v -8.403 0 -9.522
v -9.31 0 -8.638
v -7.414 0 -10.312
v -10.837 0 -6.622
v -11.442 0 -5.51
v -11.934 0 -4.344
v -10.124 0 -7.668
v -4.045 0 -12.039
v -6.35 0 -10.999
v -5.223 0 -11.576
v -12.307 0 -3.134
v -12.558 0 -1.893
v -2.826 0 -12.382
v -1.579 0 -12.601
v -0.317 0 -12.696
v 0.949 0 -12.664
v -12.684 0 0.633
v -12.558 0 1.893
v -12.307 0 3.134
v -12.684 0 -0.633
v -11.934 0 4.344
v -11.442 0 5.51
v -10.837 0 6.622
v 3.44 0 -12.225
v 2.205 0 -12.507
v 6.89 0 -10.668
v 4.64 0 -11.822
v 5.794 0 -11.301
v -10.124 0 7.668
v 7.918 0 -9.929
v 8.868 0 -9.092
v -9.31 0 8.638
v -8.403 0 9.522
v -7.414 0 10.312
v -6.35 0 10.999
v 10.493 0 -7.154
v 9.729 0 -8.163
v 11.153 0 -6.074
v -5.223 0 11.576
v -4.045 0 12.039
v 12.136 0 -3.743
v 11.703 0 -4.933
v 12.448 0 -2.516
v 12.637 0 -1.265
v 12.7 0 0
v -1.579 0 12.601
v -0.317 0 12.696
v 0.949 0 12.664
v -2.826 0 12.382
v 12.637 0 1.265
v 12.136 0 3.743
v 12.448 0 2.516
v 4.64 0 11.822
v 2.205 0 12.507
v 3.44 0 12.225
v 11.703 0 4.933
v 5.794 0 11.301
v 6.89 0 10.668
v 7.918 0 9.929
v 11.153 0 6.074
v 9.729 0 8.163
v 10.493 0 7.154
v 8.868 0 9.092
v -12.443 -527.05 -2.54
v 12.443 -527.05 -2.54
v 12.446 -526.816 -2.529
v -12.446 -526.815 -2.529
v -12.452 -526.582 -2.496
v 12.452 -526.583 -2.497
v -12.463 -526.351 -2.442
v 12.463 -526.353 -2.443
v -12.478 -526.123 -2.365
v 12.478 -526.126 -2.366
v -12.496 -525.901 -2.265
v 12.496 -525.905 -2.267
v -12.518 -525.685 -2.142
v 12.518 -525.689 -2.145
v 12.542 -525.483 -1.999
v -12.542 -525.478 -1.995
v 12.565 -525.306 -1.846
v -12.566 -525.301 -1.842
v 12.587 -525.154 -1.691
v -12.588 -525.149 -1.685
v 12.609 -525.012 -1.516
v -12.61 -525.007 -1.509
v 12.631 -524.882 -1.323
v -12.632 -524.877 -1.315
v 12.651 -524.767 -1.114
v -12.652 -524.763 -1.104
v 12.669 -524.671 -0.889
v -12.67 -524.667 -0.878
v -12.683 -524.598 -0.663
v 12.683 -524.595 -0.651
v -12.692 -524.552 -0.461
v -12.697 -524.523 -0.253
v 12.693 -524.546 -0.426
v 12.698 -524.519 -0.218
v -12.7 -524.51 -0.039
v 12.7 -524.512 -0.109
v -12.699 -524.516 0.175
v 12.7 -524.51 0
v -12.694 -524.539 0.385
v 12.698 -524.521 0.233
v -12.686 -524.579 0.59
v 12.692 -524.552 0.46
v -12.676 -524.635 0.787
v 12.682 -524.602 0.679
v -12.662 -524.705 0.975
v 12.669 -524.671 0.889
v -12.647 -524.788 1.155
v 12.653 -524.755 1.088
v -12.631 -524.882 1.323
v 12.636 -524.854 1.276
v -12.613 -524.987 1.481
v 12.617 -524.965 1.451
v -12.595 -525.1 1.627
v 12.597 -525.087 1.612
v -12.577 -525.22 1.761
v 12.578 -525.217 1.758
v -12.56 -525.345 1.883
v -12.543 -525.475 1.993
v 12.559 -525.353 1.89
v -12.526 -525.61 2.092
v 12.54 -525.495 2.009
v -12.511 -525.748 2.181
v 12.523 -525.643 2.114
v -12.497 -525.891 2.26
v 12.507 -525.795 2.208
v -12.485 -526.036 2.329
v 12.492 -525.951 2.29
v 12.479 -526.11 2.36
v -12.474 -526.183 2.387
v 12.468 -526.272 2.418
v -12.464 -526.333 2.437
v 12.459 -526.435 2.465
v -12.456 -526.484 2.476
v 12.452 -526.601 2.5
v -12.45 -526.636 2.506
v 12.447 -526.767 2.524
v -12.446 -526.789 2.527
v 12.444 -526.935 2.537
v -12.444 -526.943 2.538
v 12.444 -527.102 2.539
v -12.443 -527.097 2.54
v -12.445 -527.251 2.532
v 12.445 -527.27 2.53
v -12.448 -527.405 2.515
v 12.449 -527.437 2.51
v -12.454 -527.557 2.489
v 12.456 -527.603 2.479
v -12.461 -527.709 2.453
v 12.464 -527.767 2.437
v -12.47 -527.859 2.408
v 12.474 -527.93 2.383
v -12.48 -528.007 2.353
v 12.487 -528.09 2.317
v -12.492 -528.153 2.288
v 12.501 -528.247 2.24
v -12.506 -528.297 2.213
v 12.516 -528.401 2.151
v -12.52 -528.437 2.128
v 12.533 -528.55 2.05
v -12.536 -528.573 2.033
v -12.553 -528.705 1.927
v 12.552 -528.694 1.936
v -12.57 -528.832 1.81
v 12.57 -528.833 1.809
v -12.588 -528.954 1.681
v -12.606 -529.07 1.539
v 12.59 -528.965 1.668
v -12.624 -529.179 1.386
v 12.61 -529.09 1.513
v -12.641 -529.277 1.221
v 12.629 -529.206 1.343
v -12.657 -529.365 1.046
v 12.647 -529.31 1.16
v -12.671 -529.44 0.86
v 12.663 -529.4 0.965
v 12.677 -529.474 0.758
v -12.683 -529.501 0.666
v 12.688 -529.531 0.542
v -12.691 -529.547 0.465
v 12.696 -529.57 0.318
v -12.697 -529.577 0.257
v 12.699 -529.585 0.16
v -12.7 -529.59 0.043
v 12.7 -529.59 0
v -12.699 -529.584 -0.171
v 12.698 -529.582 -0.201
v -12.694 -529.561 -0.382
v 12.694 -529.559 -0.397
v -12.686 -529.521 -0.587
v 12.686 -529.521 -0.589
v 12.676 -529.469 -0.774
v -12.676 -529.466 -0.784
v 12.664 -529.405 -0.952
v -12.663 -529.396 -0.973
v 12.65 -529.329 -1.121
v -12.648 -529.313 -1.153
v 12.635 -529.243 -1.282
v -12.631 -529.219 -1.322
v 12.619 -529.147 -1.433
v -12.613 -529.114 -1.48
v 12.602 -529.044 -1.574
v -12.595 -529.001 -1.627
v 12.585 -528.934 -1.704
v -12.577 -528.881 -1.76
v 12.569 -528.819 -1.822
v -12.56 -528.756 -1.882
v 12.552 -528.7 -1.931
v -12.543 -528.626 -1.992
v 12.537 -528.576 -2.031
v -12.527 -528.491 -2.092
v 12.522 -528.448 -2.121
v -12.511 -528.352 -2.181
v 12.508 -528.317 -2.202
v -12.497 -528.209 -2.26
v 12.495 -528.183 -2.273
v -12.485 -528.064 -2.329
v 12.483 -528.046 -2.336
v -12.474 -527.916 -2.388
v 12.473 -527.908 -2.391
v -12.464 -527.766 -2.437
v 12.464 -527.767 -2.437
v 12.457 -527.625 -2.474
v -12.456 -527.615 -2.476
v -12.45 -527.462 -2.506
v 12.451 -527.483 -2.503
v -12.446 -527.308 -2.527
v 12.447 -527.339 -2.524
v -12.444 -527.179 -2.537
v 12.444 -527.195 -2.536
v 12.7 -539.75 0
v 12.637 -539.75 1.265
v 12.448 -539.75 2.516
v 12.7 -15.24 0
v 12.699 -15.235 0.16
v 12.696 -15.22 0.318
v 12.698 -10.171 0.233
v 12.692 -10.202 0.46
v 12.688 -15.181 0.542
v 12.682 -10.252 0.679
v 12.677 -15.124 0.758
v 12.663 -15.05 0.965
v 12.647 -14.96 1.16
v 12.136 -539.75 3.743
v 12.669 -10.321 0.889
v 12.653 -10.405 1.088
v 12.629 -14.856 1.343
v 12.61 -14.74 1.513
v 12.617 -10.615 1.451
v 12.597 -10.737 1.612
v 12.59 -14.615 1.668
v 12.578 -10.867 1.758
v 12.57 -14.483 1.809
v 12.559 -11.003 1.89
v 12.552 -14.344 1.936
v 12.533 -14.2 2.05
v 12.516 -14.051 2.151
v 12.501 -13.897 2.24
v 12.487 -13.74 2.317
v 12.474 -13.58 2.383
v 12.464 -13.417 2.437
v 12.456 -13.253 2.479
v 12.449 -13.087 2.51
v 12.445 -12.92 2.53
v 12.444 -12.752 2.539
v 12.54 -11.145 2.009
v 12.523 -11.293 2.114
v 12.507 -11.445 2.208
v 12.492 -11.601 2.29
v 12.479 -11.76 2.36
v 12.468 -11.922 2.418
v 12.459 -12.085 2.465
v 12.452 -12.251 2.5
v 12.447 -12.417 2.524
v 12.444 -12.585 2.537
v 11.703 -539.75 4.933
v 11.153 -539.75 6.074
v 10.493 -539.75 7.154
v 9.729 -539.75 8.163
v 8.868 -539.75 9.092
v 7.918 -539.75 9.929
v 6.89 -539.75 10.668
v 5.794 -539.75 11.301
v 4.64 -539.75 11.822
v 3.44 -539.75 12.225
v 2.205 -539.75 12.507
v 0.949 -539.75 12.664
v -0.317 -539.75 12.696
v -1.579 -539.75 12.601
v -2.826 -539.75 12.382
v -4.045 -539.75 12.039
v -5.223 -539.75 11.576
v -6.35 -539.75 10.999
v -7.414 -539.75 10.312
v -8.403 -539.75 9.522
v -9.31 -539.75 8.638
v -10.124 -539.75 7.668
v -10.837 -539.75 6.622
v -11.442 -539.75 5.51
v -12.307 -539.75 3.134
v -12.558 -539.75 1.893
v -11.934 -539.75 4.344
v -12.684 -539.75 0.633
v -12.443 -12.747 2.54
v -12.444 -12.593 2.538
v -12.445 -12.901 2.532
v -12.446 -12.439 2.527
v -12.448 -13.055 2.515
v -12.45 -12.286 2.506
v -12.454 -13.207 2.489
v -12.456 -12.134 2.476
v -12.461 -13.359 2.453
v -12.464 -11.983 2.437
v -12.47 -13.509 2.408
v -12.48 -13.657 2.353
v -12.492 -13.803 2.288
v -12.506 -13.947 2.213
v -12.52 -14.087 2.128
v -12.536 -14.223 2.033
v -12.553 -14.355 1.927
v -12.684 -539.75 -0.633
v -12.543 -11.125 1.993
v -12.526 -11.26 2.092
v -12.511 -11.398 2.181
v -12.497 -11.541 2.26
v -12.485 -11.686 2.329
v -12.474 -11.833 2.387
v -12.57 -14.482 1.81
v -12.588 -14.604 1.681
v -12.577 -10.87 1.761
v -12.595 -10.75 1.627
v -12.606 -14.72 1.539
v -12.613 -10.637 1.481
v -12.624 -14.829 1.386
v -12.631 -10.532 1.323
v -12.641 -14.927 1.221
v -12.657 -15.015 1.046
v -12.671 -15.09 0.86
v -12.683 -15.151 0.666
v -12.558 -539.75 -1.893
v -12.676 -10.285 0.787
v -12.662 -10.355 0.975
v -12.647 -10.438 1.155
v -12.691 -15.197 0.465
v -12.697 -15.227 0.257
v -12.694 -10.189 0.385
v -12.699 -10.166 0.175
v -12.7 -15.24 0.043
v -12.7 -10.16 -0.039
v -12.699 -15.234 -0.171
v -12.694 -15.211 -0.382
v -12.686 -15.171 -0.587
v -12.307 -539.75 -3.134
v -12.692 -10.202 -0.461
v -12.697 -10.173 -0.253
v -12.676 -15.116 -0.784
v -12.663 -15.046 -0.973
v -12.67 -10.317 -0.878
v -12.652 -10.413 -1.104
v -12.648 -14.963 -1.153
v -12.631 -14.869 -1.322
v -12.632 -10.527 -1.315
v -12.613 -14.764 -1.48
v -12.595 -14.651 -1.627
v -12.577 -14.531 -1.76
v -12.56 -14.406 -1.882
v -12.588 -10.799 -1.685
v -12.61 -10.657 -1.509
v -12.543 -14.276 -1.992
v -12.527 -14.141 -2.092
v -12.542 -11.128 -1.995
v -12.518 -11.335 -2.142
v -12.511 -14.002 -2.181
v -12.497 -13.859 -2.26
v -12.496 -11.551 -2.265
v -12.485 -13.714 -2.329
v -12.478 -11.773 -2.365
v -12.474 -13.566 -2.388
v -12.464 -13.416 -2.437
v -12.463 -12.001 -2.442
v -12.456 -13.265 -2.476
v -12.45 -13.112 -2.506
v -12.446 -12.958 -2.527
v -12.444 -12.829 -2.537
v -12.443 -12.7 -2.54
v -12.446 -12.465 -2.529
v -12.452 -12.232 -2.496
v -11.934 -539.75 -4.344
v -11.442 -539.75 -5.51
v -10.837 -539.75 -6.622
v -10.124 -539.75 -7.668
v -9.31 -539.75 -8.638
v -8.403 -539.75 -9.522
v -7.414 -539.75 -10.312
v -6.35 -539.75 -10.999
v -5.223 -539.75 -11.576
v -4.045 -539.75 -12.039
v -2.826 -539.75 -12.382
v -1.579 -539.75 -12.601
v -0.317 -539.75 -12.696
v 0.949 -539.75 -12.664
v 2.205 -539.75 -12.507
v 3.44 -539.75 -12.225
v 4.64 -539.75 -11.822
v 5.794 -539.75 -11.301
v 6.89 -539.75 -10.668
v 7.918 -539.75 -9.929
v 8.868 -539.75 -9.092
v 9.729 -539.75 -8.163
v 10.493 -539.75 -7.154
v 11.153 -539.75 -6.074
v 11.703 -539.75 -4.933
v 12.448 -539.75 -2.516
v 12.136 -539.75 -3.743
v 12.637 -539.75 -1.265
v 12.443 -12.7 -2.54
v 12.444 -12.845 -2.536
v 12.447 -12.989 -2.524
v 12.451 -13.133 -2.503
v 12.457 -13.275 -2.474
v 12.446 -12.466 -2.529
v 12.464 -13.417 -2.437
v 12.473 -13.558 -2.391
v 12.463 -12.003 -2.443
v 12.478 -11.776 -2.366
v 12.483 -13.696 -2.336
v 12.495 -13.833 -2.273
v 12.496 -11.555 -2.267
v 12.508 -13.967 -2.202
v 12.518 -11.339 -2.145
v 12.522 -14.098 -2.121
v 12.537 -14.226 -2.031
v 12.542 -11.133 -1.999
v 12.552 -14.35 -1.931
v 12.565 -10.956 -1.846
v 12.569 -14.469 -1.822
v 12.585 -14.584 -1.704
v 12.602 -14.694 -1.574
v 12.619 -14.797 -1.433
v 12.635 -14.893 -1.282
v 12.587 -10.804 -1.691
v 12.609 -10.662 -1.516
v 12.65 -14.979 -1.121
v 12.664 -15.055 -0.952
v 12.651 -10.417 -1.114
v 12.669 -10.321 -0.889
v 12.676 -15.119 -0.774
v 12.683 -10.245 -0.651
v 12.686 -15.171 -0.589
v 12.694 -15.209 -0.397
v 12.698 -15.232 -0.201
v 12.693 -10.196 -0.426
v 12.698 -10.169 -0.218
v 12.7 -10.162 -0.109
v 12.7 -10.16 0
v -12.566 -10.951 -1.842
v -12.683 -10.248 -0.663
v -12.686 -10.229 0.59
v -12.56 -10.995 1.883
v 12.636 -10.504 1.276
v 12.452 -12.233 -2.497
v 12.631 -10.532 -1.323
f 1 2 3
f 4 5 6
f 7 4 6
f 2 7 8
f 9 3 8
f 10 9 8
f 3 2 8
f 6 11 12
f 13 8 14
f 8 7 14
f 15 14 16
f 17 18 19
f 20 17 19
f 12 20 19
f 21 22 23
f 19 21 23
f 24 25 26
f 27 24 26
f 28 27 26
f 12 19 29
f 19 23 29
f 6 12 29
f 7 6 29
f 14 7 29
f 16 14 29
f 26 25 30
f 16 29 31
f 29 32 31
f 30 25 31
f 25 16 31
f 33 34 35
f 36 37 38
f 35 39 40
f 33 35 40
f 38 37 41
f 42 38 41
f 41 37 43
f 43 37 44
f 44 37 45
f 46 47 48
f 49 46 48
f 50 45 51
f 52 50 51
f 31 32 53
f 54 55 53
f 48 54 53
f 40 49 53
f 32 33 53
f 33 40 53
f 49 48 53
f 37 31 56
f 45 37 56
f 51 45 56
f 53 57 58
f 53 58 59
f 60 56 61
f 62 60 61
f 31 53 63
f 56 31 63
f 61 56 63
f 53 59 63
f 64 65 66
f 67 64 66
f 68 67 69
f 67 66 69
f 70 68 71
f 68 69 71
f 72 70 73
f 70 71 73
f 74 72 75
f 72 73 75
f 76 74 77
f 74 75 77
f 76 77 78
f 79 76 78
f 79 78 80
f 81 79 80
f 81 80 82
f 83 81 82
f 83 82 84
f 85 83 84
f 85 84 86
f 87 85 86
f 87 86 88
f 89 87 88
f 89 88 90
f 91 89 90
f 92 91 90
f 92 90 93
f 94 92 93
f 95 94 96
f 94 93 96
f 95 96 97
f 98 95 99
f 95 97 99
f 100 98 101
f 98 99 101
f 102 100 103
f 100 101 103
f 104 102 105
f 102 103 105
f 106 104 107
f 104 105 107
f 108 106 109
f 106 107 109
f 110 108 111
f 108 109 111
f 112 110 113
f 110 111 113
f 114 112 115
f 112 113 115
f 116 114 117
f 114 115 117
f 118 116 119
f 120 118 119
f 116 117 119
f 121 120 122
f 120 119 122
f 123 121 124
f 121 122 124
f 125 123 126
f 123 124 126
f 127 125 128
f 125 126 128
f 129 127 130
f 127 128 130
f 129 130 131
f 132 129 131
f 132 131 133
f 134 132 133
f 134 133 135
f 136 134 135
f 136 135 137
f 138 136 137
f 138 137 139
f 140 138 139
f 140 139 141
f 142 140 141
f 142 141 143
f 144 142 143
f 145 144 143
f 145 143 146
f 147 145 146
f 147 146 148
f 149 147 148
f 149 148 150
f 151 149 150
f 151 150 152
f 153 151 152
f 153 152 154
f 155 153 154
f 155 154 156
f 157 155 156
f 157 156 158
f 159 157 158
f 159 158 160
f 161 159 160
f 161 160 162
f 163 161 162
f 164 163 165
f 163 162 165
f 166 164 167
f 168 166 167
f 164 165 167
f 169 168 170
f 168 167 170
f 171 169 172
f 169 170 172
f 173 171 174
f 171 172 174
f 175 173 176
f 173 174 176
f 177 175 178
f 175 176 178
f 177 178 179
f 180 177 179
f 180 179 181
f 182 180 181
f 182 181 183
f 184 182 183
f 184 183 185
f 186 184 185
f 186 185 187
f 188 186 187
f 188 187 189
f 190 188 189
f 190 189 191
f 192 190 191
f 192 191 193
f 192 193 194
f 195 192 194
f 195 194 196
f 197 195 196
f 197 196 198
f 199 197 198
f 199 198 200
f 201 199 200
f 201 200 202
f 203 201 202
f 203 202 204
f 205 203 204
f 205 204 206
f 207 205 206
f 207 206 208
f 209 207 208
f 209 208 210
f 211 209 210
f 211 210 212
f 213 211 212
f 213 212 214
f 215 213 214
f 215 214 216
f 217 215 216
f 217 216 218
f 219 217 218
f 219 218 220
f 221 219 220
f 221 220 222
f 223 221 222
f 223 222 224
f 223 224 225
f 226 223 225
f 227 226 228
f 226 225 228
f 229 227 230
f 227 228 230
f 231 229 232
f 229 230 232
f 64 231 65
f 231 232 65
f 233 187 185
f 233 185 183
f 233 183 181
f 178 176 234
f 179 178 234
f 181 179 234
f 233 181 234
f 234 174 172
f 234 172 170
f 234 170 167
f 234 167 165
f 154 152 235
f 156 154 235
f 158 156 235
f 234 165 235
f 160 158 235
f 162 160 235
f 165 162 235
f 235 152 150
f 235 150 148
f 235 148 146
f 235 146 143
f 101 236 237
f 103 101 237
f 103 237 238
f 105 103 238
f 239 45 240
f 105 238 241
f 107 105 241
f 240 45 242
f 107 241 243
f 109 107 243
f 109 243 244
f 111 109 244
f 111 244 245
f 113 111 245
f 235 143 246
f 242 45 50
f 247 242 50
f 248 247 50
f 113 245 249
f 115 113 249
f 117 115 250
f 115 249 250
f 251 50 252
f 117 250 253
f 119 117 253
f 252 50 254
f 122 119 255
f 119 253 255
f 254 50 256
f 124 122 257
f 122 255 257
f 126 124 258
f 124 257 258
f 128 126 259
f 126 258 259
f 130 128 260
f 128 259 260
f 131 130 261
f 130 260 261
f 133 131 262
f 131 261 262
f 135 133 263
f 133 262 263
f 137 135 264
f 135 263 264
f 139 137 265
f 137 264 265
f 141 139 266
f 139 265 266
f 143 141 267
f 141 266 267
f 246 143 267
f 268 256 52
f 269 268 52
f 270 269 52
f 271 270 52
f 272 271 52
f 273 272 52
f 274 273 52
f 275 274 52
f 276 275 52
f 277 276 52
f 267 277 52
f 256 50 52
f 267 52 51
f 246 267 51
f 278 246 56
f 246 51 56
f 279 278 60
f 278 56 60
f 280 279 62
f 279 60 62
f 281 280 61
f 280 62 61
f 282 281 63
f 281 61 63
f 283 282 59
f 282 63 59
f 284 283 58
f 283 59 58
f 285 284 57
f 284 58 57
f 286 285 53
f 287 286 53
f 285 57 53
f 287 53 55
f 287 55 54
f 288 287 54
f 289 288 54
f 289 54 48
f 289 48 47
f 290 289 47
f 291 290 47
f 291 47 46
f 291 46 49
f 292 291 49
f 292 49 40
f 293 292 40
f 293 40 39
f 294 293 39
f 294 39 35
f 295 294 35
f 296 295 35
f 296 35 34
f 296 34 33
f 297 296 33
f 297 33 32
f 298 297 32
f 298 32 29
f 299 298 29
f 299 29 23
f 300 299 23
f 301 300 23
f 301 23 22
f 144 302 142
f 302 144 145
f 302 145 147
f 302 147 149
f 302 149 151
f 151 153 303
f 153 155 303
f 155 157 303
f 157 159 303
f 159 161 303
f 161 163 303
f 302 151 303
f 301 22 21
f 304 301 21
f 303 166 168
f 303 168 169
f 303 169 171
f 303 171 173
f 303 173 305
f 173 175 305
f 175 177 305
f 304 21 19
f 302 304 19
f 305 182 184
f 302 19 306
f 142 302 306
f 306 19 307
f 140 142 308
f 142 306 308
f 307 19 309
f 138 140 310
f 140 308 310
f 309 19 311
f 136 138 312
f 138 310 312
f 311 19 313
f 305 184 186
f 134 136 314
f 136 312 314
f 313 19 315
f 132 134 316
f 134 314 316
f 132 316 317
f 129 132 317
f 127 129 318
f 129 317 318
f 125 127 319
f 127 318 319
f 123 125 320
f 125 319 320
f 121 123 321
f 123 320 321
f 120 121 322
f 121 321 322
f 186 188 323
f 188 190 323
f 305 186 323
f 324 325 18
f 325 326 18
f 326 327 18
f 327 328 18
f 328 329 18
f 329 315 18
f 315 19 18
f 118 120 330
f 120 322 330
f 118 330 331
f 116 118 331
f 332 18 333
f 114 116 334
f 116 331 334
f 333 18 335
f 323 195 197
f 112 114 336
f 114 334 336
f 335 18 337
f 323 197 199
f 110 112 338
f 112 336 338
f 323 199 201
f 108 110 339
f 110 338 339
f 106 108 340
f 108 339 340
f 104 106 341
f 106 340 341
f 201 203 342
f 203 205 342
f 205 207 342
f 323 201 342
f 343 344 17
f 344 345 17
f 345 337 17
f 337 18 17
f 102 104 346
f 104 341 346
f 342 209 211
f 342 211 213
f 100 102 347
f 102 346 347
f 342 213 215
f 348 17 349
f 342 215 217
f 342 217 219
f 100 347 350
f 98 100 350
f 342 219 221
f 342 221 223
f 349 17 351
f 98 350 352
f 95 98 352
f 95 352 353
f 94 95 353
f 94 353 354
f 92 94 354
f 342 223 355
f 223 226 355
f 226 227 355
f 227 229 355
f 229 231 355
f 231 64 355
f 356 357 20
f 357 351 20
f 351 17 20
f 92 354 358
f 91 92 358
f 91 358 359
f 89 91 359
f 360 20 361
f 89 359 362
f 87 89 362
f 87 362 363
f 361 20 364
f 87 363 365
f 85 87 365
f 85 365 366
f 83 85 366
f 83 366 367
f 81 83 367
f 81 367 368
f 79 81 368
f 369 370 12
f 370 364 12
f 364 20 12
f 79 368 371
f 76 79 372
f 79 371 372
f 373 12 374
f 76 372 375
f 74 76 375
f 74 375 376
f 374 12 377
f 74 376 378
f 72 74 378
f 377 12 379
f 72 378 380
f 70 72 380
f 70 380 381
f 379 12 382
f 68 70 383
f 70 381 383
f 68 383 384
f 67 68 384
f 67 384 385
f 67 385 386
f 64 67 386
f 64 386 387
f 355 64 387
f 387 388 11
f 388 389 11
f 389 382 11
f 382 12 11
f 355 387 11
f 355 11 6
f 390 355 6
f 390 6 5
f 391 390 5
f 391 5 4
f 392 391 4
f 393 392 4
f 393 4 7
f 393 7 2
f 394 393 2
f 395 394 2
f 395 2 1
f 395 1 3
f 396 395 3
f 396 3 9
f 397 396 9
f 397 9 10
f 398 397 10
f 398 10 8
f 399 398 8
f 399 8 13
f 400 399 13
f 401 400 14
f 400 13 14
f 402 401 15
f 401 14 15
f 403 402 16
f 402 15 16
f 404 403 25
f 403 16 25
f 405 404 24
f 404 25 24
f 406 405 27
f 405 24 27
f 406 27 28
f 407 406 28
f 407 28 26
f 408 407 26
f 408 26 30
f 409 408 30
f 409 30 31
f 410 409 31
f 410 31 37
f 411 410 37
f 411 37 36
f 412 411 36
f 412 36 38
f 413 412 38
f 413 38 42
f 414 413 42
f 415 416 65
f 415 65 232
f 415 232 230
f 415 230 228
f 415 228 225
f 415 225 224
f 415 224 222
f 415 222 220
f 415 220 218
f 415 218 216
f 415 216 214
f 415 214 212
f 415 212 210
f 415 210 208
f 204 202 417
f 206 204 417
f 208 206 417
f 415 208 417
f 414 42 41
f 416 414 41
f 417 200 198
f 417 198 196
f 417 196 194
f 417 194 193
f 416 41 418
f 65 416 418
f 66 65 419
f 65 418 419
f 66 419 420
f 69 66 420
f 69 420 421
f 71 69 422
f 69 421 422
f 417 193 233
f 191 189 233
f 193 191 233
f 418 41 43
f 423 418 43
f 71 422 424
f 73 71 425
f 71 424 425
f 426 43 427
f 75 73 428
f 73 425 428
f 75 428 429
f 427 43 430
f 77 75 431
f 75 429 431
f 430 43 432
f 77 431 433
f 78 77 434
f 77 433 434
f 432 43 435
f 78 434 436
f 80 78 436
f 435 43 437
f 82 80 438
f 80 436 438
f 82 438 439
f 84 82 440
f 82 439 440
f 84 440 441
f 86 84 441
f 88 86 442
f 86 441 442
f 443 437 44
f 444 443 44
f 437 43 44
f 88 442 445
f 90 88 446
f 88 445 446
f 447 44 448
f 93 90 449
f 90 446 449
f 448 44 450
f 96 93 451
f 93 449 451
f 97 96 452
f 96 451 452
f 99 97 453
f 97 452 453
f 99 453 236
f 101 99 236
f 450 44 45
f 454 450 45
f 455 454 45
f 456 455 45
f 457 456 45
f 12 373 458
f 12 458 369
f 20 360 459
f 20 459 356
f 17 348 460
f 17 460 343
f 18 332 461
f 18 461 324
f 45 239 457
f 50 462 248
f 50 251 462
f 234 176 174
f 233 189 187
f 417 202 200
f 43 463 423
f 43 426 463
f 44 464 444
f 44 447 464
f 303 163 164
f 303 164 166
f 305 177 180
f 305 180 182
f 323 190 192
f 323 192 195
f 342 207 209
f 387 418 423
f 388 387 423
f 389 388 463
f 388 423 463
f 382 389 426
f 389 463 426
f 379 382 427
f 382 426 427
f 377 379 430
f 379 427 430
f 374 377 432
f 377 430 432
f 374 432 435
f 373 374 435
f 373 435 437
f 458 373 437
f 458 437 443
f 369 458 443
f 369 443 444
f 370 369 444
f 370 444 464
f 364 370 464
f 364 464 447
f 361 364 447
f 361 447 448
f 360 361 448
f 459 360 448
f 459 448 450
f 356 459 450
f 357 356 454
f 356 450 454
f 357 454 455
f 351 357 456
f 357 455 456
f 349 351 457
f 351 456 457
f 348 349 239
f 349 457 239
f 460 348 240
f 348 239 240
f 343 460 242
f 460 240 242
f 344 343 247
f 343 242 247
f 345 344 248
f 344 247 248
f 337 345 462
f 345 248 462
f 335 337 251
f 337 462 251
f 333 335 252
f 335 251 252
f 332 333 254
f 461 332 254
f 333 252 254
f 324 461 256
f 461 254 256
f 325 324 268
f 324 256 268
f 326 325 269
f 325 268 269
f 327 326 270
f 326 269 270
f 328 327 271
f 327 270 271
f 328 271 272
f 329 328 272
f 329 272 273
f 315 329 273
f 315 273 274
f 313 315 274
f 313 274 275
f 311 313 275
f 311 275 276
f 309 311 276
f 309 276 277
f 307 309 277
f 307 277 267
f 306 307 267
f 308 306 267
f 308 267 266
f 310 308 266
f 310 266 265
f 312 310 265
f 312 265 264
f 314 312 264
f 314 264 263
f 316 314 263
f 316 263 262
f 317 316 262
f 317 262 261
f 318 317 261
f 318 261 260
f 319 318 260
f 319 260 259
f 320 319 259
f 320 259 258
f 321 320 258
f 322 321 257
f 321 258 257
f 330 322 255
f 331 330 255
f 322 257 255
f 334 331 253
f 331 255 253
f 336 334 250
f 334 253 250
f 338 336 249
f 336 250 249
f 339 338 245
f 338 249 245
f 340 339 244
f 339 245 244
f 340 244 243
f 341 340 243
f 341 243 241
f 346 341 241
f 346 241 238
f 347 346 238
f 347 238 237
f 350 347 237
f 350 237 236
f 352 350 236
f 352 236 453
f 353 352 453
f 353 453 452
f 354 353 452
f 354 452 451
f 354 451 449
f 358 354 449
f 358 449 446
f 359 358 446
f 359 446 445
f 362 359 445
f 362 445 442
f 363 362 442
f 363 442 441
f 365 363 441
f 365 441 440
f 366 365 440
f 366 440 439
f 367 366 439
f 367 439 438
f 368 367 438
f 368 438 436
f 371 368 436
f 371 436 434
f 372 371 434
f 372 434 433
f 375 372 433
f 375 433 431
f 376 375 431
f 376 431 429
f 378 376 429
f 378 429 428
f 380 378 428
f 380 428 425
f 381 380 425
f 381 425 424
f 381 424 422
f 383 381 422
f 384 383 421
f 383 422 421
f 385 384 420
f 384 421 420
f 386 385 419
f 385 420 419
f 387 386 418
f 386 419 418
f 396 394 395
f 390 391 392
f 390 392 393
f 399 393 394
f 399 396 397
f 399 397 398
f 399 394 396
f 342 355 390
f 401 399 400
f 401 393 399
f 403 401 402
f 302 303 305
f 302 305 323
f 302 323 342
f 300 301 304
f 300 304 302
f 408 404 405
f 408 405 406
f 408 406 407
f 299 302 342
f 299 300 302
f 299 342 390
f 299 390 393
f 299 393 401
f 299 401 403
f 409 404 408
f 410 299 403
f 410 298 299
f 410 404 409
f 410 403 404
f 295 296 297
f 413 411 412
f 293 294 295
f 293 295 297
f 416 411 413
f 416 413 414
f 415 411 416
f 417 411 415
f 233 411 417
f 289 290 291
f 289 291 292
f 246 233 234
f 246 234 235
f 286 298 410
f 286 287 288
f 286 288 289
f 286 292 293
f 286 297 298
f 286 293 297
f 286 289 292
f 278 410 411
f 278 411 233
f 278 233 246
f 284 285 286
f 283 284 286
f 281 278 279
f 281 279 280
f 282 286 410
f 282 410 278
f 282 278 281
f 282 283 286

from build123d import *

# Parameters (mm, degrees)
CYLINDER_R             = 12.7
CYLINDER_DEPTH         = 539.75
CYLINDER_ROLL_ANGLE    = 90
BASEFEATURE_ROLL_ANGLE = -90
SKETCH_R               = 2.54
POCKET_DEPTH           = 25.401
BODY_ROLL_ANGLE        = 90


with BuildPart() as part:
    # Cylinder → Cylinder (new body)
    with BuildSketch(Plane.XY):
        Circle(CYLINDER_R)
    extrude(amount=CYLINDER_DEPTH)


with BuildPart() as part_1:
    # Cylinder roll: moved
    add(part.part.rotate(Axis((0, 0, 0), (1, 0, 0)), CYLINDER_ROLL_ANGLE))


with BuildPart() as part_2:
    # Cylinder placement: moved
    add(part_1.part)


with BuildPart() as part_3:
    # BaseFeature roll: moved
    add(part_2.part.rotate(Axis((0, 0, 0), (1, 0, 0)), BASEFEATURE_ROLL_ANGLE))


with BuildPart() as part_4:
    # BaseFeature placement: moved
    add(part_3.part)

    # Sketch (on DatumPlane) → Pocket (cut, through all)
    with BuildSketch(Plane(origin=(12.7, 0, 269.875), x_dir=(0, -1, 0), z_dir=(1, 0, 0))):
        with Locations((0, -257.175)):
            Circle(SKETCH_R)
        with Locations((0, 257.175)):
            Circle(SKETCH_R)
    extrude(amount=-POCKET_DEPTH, mode=Mode.SUBTRACT)


with BuildPart() as part_5:
    # Body roll: moved
    add(part_4.part.rotate(Axis((0, 0, 0), (1, 0, 0)), BODY_ROLL_ANGLE))


with BuildPart() as part_6:
    # Body placement: moved
    add(part_5.part)


solid = part_6.part
